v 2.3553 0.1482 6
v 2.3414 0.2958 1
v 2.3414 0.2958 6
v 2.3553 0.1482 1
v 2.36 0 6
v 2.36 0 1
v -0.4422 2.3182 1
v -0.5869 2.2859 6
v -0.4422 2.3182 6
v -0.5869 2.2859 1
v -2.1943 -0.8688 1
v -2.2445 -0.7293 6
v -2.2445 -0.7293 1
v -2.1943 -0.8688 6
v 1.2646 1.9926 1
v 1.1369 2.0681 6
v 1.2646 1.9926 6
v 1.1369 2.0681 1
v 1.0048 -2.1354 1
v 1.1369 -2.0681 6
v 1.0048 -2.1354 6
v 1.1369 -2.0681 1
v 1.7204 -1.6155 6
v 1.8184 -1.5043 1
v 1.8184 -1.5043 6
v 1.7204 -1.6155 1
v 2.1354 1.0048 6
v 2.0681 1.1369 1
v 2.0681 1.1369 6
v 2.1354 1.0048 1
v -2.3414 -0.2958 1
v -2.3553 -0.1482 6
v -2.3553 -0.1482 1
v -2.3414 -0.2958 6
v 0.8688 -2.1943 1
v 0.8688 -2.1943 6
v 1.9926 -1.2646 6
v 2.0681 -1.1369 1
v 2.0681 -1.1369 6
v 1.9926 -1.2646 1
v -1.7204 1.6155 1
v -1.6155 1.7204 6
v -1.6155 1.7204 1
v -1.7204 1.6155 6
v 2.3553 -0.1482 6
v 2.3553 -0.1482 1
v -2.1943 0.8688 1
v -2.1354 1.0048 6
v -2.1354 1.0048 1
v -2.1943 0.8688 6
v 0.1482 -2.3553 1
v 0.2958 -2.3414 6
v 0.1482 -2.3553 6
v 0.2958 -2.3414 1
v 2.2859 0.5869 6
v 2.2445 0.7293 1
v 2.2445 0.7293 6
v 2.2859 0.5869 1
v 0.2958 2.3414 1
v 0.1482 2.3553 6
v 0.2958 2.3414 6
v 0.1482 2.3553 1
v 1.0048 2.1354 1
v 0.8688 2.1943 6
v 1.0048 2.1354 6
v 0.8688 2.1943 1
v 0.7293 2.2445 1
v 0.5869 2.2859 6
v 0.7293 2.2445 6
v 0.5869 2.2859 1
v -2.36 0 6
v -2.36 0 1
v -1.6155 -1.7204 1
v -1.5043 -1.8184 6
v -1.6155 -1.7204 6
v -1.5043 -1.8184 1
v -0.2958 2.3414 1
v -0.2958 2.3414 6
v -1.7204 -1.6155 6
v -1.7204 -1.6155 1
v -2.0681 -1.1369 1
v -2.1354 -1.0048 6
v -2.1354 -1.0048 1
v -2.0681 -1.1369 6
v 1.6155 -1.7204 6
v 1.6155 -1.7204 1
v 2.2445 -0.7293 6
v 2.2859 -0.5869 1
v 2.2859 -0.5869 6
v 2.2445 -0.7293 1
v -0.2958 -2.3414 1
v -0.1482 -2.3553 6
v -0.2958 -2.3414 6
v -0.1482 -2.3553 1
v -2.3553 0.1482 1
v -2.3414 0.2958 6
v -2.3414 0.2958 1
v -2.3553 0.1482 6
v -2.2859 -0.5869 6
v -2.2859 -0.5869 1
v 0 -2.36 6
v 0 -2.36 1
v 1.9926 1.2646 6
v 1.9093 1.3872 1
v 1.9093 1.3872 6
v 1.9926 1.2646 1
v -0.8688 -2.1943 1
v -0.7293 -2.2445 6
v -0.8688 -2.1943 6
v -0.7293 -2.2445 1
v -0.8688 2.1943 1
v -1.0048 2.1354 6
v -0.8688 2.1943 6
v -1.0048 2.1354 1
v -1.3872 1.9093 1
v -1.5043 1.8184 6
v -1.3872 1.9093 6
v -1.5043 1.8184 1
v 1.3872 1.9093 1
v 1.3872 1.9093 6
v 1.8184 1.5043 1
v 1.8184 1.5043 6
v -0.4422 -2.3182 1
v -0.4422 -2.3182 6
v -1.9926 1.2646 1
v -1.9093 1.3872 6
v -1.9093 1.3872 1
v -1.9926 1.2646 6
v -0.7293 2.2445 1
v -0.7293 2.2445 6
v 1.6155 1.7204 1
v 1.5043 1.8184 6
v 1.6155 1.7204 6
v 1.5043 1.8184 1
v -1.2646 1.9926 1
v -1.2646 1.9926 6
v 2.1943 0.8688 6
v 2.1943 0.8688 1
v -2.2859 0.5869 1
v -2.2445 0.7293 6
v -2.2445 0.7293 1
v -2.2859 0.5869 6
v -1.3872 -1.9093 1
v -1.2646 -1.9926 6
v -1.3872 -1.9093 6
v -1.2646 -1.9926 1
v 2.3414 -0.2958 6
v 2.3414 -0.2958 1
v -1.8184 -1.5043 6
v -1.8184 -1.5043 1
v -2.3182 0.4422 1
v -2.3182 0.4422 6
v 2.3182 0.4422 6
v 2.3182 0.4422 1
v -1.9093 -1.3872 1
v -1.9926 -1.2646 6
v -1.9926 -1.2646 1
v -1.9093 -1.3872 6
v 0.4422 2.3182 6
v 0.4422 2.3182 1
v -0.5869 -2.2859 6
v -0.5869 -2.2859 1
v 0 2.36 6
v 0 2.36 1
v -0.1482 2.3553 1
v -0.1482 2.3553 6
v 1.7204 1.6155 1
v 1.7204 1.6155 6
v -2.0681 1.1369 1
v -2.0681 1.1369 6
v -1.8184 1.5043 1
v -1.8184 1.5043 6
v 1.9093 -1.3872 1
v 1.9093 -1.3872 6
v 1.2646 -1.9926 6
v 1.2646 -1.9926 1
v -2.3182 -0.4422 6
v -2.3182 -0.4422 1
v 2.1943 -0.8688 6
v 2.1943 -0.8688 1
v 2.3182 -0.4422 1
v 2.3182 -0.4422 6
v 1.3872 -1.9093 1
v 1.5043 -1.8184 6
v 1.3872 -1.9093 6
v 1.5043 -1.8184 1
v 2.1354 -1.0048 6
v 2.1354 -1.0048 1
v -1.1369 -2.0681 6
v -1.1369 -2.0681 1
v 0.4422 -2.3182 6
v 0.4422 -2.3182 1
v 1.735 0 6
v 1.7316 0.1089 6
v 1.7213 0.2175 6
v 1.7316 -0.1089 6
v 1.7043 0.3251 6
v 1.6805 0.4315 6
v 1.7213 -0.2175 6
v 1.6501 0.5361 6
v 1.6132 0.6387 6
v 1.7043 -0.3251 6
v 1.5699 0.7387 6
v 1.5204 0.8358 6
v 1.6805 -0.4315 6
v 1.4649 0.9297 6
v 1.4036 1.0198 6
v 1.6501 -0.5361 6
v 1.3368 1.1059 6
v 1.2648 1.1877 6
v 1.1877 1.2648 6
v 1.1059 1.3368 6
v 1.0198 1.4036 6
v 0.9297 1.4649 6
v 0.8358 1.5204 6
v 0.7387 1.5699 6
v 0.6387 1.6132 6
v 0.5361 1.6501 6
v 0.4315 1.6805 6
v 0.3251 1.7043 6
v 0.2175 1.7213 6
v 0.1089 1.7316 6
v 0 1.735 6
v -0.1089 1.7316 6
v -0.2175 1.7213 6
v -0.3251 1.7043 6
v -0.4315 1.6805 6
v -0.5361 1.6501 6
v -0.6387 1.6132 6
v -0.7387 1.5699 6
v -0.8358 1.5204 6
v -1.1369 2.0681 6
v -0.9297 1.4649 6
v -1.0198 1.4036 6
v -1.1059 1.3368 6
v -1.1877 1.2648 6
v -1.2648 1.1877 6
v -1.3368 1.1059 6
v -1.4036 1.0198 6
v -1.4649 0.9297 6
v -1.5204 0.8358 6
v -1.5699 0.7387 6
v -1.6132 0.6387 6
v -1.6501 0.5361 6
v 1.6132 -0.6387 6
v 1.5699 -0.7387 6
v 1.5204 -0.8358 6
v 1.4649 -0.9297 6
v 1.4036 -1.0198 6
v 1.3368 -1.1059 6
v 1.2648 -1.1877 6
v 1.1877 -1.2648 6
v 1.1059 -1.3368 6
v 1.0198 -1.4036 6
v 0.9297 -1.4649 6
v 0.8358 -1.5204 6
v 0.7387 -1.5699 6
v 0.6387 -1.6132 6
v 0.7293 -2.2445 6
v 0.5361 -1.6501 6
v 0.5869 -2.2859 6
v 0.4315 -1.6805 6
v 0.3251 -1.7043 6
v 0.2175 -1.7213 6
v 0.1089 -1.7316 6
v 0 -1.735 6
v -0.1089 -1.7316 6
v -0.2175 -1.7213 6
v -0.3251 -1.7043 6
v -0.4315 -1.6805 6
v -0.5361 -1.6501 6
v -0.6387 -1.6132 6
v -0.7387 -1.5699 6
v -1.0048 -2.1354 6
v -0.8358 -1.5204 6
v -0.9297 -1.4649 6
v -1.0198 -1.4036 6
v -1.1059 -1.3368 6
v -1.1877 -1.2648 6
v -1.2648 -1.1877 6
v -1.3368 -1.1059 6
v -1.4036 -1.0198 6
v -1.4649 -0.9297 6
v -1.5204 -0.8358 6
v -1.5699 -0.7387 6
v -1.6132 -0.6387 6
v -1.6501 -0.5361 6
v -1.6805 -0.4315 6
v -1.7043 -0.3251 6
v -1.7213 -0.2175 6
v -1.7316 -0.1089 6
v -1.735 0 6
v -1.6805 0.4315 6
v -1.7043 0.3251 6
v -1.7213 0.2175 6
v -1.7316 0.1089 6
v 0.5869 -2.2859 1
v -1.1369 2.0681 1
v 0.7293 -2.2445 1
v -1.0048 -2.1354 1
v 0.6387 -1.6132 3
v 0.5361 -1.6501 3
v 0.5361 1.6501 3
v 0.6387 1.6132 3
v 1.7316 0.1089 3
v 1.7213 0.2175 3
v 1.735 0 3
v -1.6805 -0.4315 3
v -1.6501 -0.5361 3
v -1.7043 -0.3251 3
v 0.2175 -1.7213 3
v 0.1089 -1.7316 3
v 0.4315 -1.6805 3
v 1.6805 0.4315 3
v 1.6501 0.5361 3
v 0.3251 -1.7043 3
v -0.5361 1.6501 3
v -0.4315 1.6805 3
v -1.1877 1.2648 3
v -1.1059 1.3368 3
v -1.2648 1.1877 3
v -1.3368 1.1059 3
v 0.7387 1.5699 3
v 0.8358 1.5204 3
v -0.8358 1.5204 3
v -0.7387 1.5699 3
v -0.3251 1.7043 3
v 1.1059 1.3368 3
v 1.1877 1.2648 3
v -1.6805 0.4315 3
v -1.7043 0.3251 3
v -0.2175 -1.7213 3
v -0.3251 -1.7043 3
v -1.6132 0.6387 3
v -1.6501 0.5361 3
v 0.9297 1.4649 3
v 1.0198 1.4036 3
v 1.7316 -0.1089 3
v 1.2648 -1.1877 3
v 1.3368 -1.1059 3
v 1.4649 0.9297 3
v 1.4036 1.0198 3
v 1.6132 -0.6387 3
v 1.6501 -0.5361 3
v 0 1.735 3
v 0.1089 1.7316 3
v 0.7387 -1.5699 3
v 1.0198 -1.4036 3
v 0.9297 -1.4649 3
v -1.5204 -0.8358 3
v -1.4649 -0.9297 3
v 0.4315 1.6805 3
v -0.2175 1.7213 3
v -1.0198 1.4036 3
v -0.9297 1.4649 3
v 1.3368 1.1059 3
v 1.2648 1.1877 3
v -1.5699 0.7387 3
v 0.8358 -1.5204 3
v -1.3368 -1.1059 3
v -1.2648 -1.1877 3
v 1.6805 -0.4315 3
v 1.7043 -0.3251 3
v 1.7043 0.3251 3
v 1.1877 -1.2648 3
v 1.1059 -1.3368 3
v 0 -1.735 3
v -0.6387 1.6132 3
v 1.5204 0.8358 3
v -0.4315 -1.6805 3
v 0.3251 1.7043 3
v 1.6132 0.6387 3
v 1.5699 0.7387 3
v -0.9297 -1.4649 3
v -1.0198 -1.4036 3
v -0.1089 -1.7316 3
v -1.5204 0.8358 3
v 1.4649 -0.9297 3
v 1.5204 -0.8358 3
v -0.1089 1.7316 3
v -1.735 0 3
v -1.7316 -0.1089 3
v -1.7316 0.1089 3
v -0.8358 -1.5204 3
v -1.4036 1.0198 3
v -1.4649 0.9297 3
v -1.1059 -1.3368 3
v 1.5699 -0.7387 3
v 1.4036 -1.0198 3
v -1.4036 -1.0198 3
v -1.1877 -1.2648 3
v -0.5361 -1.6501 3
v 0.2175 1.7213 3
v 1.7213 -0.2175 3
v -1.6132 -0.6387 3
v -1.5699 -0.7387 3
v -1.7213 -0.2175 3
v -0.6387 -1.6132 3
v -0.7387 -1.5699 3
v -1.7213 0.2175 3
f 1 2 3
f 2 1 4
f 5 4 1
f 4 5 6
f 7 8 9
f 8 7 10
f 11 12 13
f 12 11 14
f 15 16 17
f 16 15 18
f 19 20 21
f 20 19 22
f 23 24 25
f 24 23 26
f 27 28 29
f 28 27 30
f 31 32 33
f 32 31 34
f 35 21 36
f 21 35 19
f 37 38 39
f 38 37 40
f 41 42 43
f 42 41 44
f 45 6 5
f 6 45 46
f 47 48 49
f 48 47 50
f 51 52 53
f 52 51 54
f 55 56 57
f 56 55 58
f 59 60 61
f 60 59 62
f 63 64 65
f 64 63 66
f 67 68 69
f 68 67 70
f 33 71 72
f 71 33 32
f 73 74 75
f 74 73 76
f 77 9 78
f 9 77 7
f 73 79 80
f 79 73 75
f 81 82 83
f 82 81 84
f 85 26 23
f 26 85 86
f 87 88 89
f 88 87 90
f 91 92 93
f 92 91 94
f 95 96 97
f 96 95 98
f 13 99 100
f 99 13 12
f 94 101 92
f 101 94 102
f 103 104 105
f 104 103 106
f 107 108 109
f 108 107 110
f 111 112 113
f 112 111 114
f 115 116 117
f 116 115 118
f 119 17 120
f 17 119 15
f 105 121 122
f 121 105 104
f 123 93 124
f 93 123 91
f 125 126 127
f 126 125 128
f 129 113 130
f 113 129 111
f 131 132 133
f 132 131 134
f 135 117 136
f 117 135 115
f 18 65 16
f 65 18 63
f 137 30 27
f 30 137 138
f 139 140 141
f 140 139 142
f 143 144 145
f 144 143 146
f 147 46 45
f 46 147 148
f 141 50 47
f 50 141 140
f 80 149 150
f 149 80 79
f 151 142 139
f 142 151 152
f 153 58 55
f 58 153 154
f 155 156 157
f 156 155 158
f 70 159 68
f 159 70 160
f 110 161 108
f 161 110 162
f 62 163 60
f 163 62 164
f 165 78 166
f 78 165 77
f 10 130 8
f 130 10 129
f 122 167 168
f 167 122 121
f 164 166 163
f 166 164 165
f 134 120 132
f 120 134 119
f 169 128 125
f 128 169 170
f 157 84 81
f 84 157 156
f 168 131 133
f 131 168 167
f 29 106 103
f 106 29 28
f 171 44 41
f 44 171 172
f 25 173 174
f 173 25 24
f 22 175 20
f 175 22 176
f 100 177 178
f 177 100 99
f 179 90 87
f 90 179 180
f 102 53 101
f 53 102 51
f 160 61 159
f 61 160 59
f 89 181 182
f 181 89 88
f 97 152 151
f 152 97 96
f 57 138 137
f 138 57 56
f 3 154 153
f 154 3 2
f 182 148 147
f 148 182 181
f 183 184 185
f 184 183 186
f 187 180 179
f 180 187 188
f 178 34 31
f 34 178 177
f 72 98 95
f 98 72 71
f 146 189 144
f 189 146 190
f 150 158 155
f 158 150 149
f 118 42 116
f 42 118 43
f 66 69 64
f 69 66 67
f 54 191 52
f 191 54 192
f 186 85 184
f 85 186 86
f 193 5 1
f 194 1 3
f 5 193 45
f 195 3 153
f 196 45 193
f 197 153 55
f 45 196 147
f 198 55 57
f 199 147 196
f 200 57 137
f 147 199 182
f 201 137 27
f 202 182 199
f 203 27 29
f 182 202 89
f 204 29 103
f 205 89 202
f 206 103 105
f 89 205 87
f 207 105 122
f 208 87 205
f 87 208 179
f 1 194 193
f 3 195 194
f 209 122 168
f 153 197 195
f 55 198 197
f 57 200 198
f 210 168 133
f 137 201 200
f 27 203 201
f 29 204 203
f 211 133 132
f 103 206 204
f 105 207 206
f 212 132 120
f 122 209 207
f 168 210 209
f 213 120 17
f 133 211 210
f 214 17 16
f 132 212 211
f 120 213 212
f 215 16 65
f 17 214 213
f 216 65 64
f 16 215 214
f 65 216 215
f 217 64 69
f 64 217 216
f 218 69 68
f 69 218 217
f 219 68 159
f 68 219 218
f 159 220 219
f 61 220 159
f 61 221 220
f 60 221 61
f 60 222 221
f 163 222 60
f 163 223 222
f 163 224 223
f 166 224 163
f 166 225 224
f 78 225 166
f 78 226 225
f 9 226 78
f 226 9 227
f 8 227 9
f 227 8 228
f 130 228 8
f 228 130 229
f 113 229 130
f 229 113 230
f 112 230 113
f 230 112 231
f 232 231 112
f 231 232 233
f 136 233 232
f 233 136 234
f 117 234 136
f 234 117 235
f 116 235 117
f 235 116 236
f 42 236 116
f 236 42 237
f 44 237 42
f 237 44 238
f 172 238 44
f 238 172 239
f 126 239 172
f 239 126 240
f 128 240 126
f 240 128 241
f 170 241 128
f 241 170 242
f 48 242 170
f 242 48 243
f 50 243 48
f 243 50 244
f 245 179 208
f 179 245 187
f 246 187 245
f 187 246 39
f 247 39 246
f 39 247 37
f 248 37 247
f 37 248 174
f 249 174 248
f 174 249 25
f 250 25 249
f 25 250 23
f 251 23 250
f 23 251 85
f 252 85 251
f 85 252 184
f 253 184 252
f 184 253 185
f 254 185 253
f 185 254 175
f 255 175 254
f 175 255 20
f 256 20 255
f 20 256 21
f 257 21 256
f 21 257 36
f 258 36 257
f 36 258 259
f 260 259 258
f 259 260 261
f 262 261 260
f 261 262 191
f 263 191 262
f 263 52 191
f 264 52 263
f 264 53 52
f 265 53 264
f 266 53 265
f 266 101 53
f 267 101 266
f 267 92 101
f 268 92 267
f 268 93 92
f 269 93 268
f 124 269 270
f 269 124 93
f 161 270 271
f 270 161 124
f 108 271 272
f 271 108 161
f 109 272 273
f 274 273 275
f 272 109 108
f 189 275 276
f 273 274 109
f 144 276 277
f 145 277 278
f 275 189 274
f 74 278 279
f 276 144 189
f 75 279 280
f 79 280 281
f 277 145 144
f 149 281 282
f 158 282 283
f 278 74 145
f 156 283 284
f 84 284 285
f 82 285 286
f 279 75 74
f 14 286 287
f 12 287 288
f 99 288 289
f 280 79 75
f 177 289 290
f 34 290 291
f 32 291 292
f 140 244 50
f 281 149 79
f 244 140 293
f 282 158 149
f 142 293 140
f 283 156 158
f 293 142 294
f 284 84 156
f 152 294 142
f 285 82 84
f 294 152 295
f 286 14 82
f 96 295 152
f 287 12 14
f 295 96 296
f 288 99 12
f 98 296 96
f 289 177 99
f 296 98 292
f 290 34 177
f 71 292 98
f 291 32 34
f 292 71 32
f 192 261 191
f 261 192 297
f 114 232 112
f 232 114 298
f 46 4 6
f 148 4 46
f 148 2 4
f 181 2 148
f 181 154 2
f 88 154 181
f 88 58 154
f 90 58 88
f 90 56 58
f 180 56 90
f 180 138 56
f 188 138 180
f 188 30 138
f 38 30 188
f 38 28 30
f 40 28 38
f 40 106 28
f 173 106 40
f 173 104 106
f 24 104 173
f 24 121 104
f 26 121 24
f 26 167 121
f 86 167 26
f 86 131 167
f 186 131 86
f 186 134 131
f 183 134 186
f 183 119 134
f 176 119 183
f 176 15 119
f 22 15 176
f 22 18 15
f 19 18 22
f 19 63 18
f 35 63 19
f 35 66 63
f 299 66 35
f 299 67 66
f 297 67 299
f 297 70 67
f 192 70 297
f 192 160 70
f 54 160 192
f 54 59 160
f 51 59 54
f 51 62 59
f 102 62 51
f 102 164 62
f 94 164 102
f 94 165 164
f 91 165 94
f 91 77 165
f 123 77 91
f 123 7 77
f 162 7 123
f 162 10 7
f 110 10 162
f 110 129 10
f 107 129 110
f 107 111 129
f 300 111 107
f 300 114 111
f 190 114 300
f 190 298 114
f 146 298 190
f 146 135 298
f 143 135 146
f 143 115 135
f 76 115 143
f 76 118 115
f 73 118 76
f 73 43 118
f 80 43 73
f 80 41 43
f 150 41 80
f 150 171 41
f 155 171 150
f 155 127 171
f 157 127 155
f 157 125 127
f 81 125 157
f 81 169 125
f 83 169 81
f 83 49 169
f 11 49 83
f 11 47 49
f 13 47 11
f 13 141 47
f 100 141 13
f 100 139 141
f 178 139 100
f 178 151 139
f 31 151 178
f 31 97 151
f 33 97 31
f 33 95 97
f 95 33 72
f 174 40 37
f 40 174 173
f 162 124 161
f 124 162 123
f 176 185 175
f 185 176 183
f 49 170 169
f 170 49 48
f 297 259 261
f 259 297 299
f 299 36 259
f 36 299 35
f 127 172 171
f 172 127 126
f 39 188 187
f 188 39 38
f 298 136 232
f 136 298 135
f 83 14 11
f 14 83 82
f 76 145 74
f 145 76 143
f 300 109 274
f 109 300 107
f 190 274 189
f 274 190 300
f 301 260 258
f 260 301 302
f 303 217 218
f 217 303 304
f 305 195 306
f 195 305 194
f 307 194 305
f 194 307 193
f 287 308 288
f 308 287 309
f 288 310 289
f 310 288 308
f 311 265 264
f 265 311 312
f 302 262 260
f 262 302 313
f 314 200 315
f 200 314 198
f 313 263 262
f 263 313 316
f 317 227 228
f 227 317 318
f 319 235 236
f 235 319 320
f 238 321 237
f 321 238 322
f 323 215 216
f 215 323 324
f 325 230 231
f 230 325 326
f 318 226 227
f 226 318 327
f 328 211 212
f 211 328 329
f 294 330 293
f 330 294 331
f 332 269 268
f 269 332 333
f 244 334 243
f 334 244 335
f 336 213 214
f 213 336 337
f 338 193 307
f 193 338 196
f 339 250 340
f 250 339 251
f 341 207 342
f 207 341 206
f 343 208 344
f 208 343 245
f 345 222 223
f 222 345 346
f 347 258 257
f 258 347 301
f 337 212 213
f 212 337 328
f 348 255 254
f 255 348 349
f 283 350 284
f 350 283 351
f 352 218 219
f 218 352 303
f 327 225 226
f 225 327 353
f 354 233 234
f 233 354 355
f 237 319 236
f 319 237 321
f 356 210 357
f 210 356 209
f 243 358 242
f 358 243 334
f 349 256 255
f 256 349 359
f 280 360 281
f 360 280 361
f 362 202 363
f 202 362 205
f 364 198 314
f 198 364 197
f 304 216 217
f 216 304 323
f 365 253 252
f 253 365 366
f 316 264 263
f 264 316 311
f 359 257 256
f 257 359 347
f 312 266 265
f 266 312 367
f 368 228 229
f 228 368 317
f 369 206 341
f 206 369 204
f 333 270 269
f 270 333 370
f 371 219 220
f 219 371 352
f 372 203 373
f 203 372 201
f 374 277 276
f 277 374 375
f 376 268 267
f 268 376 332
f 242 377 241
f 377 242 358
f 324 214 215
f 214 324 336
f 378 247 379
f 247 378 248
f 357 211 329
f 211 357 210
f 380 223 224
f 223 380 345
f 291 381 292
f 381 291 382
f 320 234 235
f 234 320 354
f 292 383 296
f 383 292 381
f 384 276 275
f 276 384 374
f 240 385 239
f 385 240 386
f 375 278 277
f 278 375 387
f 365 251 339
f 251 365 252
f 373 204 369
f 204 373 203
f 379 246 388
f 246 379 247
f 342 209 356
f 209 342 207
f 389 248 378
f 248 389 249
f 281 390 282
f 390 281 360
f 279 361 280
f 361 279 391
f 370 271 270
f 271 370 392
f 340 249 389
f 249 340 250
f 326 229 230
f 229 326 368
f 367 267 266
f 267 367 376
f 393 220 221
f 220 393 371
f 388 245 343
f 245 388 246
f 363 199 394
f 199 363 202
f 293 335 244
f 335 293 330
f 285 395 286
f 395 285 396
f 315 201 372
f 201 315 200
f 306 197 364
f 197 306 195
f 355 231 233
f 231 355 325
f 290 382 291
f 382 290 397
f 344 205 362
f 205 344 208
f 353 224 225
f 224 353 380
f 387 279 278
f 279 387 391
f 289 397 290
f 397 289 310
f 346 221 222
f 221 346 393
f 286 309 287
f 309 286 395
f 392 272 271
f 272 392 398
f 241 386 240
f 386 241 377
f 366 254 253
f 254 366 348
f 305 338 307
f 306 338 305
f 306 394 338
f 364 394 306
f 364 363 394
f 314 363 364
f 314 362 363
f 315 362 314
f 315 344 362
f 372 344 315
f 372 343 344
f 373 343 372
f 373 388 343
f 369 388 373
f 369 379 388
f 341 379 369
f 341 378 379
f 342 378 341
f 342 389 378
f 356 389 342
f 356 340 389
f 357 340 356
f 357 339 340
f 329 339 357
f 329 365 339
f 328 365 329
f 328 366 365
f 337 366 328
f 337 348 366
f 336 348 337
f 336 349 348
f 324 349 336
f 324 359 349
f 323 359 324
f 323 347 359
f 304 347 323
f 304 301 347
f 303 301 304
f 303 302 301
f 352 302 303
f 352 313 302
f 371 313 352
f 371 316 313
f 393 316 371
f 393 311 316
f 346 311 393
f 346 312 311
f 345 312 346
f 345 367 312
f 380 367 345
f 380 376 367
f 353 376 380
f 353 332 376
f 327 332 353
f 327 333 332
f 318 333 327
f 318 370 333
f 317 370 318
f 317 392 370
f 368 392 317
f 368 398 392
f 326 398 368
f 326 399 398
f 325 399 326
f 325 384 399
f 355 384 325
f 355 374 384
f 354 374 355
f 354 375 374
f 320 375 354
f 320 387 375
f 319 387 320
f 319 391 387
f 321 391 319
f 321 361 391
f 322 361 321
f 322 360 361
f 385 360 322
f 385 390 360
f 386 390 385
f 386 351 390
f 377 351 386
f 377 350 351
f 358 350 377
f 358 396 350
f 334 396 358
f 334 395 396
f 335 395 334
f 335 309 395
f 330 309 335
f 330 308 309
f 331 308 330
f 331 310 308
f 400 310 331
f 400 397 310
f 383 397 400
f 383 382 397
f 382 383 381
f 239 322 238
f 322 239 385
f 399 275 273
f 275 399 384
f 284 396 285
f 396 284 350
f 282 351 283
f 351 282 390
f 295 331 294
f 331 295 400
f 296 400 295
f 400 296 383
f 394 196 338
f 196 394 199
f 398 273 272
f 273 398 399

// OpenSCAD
// file: 28BYJ.scad
module StepMotor28BYJ()
{

	difference(){
	
		union(){
				cylinder(h = 19, r = 14, center = true, $fn = 32);
				translate([8,0,-1.5])	cylinder(h = 19, r = 4.5, center = true, $fn = 32);
				translate([8,0,-10])	cylinder(h = 19, r = 2.5, center = true, $fn = 32);


				translate([0,0,-9]) cube([7,35,0.99], center = true);				
				translate([0,17.6,-9])	cylinder(h = 1, r = 3.5, center = true, $fn = 32);

				translate([0,-17.6,-9])	cylinder(h = 1, r = 3.5, center = true, $fn = 32);


				translate([-3,0,-1]) cube([28,14.6,16.9], center = true);
				translate([-2,0,0])  cube([24.5,16,15], center = true);
			}

				// handle
				translate([11,0,-16.55]) cube([4,5,6.1], center = true);
				translate([5,0,-16.55]) cube([4,5,6.1], center = true);

				// screw holes
				translate([0,17.5,-9])	cylinder(h = 2, r = 2, center = true, $fn = 32);
				translate([0,-17.5,-9])	cylinder(h = 2, r = 2, center = true, $fn = 32);
		}
	}


%StepMotor28BYJ();
// main file
$fn = 100;

use <movement.scad>

SIZE = inch(10.75);
SECOND_DIAMETER = 3.47;

module makeShape(hand) {
  intersection() {
    translate([-SIZE/2,-SIZE/2,0]) linear_extrude(height = 2, convexity = 10)
      resize([SIZE,SIZE,1]) import (file = str(hand, "_hand.dxf"));
    cube([SIZE-30,SIZE-30,SIZE-30], center=true);
  }
}

module makeHand(hand) {
  if (hand == "second") {
    difference() {
      union() {
        makeShape(hand);
        translate([0,0,1]) cylinder(r=(SECOND_DIAMETER+1.25)/2, h=5);
      }
      translate([0,0,3]) cylinder(r=SECOND_DIAMETER/2, h=20);
    }
  } else {
    diam = hand == "minute" ? 8 : 10;
    elev = hand == "minute" ? 2 : 1;
    difference() {
      union() {
        makeShape(hand);
        cylinder(r=diam/2+1, h=5);
      }
      handgrip(hand);
    }
  }
}

dohand = "second";

makeHand(dohand);
